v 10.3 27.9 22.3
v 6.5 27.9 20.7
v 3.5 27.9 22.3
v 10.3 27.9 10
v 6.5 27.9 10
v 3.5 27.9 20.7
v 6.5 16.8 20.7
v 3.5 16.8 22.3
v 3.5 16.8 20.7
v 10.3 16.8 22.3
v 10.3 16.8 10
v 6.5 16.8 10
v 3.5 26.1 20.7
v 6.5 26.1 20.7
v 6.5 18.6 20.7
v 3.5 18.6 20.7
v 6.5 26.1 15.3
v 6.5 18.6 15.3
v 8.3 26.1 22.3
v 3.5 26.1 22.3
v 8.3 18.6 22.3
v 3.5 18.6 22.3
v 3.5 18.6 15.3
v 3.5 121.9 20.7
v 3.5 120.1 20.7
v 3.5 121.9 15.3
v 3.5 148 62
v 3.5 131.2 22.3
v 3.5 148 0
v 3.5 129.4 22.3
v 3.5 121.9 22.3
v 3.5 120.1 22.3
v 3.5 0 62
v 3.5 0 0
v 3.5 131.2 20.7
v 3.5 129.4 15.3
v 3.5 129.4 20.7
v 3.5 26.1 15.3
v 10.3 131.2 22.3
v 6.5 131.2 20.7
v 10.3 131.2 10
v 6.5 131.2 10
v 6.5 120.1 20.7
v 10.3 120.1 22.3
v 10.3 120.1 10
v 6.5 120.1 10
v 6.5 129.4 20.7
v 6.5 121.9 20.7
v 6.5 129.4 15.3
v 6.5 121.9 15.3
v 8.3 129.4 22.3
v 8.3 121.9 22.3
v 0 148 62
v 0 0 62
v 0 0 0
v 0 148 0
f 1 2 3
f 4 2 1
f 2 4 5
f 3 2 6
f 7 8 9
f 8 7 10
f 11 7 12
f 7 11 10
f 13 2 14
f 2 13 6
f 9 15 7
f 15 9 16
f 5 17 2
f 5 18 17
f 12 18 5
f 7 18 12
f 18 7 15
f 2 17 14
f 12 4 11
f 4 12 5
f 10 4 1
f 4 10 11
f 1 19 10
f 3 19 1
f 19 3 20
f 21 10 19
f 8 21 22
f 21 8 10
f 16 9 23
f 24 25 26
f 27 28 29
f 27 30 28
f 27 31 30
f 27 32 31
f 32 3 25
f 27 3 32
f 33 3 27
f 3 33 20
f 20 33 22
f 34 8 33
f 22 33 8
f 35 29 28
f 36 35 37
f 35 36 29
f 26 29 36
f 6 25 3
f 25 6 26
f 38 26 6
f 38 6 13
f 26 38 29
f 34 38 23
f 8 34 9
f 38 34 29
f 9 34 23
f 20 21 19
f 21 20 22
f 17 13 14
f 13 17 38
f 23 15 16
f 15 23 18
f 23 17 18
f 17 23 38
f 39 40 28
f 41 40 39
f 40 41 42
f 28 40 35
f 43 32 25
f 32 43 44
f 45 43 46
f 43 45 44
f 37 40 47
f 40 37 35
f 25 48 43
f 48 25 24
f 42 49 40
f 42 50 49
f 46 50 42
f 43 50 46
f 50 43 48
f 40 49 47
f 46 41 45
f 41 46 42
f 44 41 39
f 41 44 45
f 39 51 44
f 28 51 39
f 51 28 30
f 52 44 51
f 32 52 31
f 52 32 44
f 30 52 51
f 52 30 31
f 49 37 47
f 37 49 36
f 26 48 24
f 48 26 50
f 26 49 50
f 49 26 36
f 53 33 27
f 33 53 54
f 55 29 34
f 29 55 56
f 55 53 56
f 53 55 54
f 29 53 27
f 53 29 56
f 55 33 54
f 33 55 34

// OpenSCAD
// created by IndiePandaaaaa | Lukas

THICKNESS = 3.5;
TOLERANCE = 0.1;
CHAMFER = 1.5;

FULL_WIDTH = 148;  // width of the original support block
HEIGHT = 62;
DISTANCE_BETWEEN_HOOKS = 92.2;

TESTING_HOOK = false;

function bosch_hook_width() = 11.1;
function bosch_hook_depth() = 6.8;
function bosch_hook_height() = 12.3;

module bosch_hook() {
    base_material_thickness = 2;
    outer_width = bosch_hook_width();
    outer_height = bosch_hook_height();
    outer_depth = bosch_hook_depth();

    top_thickness = 1.6;
    hollow_depth = 3;
    hollow_height = 5.3;
    inner_piece_width = 7.5;
    translate([- base_material_thickness, outer_width, 0]) rotate([90, 0, 0]) union() {
        linear_extrude(outer_width) {
            polygon([
                    [0, 0],
                    [base_material_thickness, 0],
                    [base_material_thickness, outer_height - top_thickness],
                    [base_material_thickness + hollow_depth, outer_height - top_thickness],
                    [base_material_thickness + hollow_depth, 0],
                    [base_material_thickness + outer_depth, 0],
                    [base_material_thickness + outer_depth, outer_height],
                    [0, outer_height],
                ]);
        }
        translate([outer_depth, outer_height, outer_width]) rotate([0, 90, 180]) linear_extrude(outer_depth) {
            distance_to_center = (outer_width - inner_piece_width) / 2;
            polygon([
                    [0, 0],
                    [distance_to_center, 0],
                    [distance_to_center, outer_height - hollow_height],
                    [distance_to_center + inner_piece_width, outer_height - hollow_height],
                    [distance_to_center + inner_piece_width, 0],
                ]);
        }
    }
}
translate([THICKNESS, - ((DISTANCE_BETWEEN_HOOKS + bosch_hook_width() * 2) - FULL_WIDTH) / 2, 10]) {
    bosch_hook();
    translate([0, DISTANCE_BETWEEN_HOOKS + bosch_hook_width(), 0]) bosch_hook();
}
cube([THICKNESS, FULL_WIDTH, HEIGHT]);

if (TESTING_HOOK) {
    translate([42, 0, 0]) {
        cube([20, bosch_hook_width(), bosch_hook_height()]);
        rotate([0, 0, 180]) translate([2, - bosch_hook_width(), 0]) bosch_hook();
    }
}
